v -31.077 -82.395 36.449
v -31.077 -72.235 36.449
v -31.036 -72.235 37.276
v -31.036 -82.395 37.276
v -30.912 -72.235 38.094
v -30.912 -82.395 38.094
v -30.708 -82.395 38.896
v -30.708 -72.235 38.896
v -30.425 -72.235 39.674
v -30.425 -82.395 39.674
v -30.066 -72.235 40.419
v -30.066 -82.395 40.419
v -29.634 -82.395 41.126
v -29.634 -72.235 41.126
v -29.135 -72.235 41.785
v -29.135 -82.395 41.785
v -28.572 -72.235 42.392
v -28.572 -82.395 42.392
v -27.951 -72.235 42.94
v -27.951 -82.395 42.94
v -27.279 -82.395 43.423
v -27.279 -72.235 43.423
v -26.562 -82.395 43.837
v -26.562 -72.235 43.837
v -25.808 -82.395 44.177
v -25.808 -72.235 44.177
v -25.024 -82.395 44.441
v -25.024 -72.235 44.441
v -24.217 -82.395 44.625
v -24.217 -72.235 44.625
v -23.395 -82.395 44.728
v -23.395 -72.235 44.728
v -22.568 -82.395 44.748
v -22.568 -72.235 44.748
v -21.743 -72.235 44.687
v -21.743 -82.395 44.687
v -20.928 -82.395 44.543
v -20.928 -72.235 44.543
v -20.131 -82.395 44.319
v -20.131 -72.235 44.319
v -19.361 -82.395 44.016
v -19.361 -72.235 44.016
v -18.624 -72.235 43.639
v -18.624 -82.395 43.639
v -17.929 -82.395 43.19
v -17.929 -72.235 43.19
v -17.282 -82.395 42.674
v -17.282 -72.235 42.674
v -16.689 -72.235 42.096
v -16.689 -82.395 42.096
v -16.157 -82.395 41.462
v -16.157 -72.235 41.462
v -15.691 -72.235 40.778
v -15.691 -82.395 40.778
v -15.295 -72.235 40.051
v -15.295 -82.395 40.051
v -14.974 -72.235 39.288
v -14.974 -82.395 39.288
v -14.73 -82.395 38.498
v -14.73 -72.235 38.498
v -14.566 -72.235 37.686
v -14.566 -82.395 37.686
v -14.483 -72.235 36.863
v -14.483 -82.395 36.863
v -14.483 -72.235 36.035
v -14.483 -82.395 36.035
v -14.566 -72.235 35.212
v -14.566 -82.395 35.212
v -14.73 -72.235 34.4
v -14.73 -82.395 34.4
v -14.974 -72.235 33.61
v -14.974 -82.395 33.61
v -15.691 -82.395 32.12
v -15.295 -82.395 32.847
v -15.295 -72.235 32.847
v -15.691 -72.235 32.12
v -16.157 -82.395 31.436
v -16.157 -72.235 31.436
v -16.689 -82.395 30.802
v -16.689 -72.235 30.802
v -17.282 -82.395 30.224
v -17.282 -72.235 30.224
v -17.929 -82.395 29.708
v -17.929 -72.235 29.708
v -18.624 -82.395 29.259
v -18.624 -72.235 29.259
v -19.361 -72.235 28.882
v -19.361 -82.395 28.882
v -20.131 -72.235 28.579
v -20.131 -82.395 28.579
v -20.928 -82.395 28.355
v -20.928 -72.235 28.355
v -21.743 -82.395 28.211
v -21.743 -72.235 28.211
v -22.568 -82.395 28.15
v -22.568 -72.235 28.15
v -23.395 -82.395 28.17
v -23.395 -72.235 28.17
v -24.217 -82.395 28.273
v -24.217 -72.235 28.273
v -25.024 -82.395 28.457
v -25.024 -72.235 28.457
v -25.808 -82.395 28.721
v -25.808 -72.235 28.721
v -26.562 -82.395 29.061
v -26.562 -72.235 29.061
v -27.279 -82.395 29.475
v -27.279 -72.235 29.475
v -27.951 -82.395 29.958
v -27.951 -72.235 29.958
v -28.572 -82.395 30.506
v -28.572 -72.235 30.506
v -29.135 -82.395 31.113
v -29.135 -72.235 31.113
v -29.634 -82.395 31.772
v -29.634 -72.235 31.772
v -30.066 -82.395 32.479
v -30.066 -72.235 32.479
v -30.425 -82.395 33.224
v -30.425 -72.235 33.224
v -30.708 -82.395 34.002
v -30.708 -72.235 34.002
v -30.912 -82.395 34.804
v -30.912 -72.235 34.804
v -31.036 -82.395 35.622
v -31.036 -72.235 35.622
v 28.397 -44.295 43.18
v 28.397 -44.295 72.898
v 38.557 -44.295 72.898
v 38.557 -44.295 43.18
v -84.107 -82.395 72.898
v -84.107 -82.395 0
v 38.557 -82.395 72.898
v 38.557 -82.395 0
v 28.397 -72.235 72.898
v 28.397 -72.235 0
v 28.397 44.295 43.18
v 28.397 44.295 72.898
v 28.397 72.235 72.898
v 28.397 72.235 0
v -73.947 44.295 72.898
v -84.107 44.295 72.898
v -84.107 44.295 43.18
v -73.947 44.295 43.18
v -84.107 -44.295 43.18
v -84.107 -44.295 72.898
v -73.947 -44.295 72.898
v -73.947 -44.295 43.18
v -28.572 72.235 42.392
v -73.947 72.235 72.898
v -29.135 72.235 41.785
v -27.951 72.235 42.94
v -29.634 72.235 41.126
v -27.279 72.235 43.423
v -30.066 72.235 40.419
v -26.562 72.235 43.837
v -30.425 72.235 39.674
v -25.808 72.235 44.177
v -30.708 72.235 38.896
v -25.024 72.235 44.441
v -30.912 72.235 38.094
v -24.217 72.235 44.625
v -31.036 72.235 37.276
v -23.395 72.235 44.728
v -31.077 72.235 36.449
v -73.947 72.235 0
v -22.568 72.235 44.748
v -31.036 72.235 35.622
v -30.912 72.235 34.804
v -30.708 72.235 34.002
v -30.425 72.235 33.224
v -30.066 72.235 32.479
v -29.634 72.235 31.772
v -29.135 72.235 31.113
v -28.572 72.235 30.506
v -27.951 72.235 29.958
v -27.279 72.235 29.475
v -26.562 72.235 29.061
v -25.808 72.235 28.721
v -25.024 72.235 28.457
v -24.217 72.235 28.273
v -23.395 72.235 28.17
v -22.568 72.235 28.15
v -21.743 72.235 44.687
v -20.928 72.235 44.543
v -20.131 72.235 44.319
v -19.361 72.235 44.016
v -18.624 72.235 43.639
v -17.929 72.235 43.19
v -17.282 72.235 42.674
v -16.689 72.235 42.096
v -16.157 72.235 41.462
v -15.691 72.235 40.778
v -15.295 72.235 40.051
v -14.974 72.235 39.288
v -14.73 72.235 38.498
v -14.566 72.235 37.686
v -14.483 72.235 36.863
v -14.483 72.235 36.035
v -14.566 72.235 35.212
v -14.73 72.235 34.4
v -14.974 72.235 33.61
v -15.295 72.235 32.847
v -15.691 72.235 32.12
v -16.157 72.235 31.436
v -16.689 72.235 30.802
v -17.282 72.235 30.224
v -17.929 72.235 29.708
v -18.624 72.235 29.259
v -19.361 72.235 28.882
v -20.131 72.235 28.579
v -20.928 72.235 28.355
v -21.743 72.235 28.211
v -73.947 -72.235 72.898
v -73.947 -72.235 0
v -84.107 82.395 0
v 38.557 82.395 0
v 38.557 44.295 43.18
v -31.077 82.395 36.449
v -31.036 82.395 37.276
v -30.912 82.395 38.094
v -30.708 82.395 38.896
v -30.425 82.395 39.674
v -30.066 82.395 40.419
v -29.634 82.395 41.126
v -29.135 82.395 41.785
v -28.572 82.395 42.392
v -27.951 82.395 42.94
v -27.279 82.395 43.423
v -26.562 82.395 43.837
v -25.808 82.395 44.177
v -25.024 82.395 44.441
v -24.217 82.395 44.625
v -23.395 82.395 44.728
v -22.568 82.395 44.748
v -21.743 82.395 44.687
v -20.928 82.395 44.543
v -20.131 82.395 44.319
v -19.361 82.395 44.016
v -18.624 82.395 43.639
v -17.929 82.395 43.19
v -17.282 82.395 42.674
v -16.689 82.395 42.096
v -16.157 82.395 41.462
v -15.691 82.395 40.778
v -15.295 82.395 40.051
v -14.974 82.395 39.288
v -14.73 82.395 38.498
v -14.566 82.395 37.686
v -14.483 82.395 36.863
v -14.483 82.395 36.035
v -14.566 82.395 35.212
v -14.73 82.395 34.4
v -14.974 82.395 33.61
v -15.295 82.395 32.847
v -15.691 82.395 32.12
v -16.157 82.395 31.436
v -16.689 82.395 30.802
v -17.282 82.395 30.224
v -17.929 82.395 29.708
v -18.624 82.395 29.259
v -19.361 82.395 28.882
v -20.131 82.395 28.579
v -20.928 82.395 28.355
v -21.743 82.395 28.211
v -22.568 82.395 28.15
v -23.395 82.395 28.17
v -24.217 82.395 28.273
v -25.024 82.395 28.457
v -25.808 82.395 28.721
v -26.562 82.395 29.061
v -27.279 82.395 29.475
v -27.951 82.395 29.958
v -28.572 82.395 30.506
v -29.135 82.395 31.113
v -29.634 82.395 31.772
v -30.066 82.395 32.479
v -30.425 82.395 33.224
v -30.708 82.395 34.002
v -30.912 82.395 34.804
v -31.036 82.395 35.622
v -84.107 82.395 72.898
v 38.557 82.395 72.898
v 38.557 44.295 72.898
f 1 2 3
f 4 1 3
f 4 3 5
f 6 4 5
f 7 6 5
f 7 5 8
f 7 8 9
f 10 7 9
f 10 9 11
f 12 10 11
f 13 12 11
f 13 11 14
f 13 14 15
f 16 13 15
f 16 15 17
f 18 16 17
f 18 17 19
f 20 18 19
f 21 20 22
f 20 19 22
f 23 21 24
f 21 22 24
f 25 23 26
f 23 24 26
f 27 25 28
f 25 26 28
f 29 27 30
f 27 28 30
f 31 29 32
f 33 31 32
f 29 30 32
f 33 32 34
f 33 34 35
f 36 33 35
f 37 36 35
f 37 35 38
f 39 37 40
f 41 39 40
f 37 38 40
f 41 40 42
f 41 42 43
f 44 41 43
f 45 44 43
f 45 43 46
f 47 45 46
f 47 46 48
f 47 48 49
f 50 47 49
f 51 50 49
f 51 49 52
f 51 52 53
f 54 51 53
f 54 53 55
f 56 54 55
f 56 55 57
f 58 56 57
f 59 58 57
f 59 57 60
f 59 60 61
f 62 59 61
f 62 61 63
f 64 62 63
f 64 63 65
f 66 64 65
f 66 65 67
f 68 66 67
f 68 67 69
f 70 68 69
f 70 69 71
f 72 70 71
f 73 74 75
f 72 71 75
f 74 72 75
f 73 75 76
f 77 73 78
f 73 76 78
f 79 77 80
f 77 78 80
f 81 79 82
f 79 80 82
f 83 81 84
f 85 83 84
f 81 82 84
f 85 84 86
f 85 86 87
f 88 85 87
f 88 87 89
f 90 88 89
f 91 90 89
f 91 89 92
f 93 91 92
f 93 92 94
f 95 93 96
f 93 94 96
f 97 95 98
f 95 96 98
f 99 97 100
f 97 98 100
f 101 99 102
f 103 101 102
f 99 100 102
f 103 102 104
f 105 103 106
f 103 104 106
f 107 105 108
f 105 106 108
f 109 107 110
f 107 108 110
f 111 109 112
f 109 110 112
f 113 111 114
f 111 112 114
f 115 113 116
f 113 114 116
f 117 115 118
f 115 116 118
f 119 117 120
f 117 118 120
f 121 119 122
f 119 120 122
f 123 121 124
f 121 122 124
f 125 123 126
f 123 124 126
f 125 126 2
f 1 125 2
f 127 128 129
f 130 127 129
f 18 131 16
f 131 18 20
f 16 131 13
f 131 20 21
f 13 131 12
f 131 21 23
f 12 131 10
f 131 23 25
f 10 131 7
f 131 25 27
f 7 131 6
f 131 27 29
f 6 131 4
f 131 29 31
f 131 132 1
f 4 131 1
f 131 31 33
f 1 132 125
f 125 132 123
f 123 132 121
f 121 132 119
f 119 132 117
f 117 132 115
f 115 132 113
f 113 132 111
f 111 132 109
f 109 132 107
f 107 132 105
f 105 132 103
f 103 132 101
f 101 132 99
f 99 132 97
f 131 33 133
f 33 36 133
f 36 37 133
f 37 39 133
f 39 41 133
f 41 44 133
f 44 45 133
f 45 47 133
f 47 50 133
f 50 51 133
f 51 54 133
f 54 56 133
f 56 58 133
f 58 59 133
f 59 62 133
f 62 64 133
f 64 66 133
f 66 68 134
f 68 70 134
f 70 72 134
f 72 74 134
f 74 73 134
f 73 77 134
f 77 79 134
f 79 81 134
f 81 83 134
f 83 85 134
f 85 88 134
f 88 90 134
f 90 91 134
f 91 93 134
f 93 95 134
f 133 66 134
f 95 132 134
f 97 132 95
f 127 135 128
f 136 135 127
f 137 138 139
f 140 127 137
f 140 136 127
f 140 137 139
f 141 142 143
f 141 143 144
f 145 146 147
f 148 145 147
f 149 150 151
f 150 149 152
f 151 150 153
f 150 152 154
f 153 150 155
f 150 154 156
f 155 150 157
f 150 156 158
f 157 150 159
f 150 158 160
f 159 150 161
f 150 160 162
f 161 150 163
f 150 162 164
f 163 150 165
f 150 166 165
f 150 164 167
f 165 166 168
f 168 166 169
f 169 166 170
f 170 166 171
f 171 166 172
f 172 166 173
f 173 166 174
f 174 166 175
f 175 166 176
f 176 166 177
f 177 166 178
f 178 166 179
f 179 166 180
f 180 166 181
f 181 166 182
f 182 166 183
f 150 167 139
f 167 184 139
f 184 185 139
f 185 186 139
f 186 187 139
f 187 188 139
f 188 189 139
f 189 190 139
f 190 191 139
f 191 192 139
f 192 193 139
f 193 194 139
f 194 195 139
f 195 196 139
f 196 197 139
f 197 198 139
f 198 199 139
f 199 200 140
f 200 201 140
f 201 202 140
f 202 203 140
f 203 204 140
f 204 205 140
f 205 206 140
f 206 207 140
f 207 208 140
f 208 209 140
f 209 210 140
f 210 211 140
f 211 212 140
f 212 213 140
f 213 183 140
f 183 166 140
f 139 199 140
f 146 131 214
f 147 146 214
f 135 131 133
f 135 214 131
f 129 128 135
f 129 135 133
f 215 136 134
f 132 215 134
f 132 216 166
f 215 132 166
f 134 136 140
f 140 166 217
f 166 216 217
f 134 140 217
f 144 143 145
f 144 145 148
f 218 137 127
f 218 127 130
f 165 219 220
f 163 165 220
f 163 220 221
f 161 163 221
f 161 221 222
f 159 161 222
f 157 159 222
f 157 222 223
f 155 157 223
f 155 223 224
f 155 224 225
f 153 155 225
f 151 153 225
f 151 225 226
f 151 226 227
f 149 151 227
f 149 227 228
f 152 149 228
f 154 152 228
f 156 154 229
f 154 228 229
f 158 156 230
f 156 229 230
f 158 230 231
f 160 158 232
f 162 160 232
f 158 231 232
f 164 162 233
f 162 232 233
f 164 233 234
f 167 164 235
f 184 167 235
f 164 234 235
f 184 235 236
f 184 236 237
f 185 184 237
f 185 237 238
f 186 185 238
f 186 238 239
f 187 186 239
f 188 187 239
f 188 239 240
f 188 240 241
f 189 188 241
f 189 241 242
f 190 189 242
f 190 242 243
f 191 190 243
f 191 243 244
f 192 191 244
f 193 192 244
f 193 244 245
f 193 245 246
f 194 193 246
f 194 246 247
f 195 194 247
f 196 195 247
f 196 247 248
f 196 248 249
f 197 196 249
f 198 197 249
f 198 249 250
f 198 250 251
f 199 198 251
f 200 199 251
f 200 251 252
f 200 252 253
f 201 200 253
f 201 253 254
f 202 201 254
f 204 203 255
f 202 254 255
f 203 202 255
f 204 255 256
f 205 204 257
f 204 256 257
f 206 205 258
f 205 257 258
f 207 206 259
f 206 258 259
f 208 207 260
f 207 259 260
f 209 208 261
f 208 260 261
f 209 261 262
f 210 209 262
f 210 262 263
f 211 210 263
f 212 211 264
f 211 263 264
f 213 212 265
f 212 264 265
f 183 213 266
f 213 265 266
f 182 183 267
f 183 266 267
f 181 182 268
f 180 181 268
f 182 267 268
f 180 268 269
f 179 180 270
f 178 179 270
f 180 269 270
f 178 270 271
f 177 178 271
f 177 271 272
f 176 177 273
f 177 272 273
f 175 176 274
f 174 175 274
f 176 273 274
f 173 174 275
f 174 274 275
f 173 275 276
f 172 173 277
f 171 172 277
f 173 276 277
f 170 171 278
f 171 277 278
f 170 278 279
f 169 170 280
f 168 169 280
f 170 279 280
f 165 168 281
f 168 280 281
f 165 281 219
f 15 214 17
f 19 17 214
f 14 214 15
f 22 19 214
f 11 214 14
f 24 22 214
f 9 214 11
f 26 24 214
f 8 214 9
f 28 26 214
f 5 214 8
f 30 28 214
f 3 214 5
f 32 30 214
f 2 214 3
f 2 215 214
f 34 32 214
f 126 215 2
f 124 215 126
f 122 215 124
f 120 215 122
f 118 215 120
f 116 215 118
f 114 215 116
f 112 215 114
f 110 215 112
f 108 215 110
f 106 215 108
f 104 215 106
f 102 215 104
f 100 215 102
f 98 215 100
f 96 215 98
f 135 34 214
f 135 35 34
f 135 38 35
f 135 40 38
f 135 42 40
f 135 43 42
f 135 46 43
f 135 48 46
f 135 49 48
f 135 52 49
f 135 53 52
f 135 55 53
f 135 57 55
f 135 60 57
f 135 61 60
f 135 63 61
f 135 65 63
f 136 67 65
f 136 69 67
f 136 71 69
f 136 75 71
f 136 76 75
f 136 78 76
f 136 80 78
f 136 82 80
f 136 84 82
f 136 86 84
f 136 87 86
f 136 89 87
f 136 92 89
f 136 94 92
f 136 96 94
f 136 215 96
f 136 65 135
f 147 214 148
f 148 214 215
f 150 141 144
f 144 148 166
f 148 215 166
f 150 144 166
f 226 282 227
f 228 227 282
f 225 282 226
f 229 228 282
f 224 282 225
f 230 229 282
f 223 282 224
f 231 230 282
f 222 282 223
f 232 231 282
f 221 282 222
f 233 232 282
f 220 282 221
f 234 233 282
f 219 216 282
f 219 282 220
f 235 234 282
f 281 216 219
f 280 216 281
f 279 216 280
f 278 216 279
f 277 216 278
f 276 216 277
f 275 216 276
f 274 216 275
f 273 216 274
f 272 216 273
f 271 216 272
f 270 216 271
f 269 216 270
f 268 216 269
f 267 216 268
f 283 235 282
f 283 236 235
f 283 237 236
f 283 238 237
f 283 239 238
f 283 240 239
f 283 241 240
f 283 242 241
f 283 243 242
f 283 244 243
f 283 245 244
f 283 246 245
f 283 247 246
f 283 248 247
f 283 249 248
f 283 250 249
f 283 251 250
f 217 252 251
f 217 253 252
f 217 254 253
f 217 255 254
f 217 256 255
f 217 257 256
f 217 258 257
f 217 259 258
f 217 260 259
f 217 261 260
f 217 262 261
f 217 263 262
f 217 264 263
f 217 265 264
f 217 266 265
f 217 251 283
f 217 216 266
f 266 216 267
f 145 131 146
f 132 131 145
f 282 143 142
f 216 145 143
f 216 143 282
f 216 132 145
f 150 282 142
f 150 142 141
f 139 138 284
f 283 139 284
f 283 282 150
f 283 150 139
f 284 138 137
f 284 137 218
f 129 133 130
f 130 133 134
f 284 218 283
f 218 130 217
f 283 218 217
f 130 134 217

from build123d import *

# Parameters (mm, degrees)
F0_W     = 122.6633450469
F0_H     = 164.7901384103
F0_W_2   = 102.3433450469
F0_H_2   = 144.4701384103
F1_DEPTH = 72.898
F2_R     = 8.301996535
F3_DEPTH = 244.094
F4_W     = 10.16
F4_H     = 88.5901384103
F5_DEPTH = 29.718


with BuildPart() as f1:
    # F0 (on Top) → F1 (new body)
    with BuildSketch(Plane.XY):
        with Locations((-22.7750174733, 0)):
            Rectangle(F0_W, F0_H)
        with Locations((-22.7750174733, 0)):
            Rectangle(F0_W_2, F0_H_2, mode=Mode.SUBTRACT)
    extrude(amount=F1_DEPTH)

    # F2 (on face) → F3 (cut)
    with BuildSketch(Plane(origin=(0, 82.3950692052, 0), x_dir=(-1, 0, 0), z_dir=(0, 1, 0))):
        with Locations((22.7750174733, 36.449)):
            Circle(F2_R)
    extrude(amount=-F3_DEPTH, mode=Mode.SUBTRACT)

    # F4 (on face) → F5 (cut)
    with BuildSketch(Plane.XY.offset(72.898)):
        with Locations((33.4766550502, 0)):
            Rectangle(F4_W, F4_H)
        with Locations((-79.0266899967, 0)):
            Rectangle(F4_W, F4_H)
    extrude(amount=-F5_DEPTH, mode=Mode.SUBTRACT)


solid = f1.part
